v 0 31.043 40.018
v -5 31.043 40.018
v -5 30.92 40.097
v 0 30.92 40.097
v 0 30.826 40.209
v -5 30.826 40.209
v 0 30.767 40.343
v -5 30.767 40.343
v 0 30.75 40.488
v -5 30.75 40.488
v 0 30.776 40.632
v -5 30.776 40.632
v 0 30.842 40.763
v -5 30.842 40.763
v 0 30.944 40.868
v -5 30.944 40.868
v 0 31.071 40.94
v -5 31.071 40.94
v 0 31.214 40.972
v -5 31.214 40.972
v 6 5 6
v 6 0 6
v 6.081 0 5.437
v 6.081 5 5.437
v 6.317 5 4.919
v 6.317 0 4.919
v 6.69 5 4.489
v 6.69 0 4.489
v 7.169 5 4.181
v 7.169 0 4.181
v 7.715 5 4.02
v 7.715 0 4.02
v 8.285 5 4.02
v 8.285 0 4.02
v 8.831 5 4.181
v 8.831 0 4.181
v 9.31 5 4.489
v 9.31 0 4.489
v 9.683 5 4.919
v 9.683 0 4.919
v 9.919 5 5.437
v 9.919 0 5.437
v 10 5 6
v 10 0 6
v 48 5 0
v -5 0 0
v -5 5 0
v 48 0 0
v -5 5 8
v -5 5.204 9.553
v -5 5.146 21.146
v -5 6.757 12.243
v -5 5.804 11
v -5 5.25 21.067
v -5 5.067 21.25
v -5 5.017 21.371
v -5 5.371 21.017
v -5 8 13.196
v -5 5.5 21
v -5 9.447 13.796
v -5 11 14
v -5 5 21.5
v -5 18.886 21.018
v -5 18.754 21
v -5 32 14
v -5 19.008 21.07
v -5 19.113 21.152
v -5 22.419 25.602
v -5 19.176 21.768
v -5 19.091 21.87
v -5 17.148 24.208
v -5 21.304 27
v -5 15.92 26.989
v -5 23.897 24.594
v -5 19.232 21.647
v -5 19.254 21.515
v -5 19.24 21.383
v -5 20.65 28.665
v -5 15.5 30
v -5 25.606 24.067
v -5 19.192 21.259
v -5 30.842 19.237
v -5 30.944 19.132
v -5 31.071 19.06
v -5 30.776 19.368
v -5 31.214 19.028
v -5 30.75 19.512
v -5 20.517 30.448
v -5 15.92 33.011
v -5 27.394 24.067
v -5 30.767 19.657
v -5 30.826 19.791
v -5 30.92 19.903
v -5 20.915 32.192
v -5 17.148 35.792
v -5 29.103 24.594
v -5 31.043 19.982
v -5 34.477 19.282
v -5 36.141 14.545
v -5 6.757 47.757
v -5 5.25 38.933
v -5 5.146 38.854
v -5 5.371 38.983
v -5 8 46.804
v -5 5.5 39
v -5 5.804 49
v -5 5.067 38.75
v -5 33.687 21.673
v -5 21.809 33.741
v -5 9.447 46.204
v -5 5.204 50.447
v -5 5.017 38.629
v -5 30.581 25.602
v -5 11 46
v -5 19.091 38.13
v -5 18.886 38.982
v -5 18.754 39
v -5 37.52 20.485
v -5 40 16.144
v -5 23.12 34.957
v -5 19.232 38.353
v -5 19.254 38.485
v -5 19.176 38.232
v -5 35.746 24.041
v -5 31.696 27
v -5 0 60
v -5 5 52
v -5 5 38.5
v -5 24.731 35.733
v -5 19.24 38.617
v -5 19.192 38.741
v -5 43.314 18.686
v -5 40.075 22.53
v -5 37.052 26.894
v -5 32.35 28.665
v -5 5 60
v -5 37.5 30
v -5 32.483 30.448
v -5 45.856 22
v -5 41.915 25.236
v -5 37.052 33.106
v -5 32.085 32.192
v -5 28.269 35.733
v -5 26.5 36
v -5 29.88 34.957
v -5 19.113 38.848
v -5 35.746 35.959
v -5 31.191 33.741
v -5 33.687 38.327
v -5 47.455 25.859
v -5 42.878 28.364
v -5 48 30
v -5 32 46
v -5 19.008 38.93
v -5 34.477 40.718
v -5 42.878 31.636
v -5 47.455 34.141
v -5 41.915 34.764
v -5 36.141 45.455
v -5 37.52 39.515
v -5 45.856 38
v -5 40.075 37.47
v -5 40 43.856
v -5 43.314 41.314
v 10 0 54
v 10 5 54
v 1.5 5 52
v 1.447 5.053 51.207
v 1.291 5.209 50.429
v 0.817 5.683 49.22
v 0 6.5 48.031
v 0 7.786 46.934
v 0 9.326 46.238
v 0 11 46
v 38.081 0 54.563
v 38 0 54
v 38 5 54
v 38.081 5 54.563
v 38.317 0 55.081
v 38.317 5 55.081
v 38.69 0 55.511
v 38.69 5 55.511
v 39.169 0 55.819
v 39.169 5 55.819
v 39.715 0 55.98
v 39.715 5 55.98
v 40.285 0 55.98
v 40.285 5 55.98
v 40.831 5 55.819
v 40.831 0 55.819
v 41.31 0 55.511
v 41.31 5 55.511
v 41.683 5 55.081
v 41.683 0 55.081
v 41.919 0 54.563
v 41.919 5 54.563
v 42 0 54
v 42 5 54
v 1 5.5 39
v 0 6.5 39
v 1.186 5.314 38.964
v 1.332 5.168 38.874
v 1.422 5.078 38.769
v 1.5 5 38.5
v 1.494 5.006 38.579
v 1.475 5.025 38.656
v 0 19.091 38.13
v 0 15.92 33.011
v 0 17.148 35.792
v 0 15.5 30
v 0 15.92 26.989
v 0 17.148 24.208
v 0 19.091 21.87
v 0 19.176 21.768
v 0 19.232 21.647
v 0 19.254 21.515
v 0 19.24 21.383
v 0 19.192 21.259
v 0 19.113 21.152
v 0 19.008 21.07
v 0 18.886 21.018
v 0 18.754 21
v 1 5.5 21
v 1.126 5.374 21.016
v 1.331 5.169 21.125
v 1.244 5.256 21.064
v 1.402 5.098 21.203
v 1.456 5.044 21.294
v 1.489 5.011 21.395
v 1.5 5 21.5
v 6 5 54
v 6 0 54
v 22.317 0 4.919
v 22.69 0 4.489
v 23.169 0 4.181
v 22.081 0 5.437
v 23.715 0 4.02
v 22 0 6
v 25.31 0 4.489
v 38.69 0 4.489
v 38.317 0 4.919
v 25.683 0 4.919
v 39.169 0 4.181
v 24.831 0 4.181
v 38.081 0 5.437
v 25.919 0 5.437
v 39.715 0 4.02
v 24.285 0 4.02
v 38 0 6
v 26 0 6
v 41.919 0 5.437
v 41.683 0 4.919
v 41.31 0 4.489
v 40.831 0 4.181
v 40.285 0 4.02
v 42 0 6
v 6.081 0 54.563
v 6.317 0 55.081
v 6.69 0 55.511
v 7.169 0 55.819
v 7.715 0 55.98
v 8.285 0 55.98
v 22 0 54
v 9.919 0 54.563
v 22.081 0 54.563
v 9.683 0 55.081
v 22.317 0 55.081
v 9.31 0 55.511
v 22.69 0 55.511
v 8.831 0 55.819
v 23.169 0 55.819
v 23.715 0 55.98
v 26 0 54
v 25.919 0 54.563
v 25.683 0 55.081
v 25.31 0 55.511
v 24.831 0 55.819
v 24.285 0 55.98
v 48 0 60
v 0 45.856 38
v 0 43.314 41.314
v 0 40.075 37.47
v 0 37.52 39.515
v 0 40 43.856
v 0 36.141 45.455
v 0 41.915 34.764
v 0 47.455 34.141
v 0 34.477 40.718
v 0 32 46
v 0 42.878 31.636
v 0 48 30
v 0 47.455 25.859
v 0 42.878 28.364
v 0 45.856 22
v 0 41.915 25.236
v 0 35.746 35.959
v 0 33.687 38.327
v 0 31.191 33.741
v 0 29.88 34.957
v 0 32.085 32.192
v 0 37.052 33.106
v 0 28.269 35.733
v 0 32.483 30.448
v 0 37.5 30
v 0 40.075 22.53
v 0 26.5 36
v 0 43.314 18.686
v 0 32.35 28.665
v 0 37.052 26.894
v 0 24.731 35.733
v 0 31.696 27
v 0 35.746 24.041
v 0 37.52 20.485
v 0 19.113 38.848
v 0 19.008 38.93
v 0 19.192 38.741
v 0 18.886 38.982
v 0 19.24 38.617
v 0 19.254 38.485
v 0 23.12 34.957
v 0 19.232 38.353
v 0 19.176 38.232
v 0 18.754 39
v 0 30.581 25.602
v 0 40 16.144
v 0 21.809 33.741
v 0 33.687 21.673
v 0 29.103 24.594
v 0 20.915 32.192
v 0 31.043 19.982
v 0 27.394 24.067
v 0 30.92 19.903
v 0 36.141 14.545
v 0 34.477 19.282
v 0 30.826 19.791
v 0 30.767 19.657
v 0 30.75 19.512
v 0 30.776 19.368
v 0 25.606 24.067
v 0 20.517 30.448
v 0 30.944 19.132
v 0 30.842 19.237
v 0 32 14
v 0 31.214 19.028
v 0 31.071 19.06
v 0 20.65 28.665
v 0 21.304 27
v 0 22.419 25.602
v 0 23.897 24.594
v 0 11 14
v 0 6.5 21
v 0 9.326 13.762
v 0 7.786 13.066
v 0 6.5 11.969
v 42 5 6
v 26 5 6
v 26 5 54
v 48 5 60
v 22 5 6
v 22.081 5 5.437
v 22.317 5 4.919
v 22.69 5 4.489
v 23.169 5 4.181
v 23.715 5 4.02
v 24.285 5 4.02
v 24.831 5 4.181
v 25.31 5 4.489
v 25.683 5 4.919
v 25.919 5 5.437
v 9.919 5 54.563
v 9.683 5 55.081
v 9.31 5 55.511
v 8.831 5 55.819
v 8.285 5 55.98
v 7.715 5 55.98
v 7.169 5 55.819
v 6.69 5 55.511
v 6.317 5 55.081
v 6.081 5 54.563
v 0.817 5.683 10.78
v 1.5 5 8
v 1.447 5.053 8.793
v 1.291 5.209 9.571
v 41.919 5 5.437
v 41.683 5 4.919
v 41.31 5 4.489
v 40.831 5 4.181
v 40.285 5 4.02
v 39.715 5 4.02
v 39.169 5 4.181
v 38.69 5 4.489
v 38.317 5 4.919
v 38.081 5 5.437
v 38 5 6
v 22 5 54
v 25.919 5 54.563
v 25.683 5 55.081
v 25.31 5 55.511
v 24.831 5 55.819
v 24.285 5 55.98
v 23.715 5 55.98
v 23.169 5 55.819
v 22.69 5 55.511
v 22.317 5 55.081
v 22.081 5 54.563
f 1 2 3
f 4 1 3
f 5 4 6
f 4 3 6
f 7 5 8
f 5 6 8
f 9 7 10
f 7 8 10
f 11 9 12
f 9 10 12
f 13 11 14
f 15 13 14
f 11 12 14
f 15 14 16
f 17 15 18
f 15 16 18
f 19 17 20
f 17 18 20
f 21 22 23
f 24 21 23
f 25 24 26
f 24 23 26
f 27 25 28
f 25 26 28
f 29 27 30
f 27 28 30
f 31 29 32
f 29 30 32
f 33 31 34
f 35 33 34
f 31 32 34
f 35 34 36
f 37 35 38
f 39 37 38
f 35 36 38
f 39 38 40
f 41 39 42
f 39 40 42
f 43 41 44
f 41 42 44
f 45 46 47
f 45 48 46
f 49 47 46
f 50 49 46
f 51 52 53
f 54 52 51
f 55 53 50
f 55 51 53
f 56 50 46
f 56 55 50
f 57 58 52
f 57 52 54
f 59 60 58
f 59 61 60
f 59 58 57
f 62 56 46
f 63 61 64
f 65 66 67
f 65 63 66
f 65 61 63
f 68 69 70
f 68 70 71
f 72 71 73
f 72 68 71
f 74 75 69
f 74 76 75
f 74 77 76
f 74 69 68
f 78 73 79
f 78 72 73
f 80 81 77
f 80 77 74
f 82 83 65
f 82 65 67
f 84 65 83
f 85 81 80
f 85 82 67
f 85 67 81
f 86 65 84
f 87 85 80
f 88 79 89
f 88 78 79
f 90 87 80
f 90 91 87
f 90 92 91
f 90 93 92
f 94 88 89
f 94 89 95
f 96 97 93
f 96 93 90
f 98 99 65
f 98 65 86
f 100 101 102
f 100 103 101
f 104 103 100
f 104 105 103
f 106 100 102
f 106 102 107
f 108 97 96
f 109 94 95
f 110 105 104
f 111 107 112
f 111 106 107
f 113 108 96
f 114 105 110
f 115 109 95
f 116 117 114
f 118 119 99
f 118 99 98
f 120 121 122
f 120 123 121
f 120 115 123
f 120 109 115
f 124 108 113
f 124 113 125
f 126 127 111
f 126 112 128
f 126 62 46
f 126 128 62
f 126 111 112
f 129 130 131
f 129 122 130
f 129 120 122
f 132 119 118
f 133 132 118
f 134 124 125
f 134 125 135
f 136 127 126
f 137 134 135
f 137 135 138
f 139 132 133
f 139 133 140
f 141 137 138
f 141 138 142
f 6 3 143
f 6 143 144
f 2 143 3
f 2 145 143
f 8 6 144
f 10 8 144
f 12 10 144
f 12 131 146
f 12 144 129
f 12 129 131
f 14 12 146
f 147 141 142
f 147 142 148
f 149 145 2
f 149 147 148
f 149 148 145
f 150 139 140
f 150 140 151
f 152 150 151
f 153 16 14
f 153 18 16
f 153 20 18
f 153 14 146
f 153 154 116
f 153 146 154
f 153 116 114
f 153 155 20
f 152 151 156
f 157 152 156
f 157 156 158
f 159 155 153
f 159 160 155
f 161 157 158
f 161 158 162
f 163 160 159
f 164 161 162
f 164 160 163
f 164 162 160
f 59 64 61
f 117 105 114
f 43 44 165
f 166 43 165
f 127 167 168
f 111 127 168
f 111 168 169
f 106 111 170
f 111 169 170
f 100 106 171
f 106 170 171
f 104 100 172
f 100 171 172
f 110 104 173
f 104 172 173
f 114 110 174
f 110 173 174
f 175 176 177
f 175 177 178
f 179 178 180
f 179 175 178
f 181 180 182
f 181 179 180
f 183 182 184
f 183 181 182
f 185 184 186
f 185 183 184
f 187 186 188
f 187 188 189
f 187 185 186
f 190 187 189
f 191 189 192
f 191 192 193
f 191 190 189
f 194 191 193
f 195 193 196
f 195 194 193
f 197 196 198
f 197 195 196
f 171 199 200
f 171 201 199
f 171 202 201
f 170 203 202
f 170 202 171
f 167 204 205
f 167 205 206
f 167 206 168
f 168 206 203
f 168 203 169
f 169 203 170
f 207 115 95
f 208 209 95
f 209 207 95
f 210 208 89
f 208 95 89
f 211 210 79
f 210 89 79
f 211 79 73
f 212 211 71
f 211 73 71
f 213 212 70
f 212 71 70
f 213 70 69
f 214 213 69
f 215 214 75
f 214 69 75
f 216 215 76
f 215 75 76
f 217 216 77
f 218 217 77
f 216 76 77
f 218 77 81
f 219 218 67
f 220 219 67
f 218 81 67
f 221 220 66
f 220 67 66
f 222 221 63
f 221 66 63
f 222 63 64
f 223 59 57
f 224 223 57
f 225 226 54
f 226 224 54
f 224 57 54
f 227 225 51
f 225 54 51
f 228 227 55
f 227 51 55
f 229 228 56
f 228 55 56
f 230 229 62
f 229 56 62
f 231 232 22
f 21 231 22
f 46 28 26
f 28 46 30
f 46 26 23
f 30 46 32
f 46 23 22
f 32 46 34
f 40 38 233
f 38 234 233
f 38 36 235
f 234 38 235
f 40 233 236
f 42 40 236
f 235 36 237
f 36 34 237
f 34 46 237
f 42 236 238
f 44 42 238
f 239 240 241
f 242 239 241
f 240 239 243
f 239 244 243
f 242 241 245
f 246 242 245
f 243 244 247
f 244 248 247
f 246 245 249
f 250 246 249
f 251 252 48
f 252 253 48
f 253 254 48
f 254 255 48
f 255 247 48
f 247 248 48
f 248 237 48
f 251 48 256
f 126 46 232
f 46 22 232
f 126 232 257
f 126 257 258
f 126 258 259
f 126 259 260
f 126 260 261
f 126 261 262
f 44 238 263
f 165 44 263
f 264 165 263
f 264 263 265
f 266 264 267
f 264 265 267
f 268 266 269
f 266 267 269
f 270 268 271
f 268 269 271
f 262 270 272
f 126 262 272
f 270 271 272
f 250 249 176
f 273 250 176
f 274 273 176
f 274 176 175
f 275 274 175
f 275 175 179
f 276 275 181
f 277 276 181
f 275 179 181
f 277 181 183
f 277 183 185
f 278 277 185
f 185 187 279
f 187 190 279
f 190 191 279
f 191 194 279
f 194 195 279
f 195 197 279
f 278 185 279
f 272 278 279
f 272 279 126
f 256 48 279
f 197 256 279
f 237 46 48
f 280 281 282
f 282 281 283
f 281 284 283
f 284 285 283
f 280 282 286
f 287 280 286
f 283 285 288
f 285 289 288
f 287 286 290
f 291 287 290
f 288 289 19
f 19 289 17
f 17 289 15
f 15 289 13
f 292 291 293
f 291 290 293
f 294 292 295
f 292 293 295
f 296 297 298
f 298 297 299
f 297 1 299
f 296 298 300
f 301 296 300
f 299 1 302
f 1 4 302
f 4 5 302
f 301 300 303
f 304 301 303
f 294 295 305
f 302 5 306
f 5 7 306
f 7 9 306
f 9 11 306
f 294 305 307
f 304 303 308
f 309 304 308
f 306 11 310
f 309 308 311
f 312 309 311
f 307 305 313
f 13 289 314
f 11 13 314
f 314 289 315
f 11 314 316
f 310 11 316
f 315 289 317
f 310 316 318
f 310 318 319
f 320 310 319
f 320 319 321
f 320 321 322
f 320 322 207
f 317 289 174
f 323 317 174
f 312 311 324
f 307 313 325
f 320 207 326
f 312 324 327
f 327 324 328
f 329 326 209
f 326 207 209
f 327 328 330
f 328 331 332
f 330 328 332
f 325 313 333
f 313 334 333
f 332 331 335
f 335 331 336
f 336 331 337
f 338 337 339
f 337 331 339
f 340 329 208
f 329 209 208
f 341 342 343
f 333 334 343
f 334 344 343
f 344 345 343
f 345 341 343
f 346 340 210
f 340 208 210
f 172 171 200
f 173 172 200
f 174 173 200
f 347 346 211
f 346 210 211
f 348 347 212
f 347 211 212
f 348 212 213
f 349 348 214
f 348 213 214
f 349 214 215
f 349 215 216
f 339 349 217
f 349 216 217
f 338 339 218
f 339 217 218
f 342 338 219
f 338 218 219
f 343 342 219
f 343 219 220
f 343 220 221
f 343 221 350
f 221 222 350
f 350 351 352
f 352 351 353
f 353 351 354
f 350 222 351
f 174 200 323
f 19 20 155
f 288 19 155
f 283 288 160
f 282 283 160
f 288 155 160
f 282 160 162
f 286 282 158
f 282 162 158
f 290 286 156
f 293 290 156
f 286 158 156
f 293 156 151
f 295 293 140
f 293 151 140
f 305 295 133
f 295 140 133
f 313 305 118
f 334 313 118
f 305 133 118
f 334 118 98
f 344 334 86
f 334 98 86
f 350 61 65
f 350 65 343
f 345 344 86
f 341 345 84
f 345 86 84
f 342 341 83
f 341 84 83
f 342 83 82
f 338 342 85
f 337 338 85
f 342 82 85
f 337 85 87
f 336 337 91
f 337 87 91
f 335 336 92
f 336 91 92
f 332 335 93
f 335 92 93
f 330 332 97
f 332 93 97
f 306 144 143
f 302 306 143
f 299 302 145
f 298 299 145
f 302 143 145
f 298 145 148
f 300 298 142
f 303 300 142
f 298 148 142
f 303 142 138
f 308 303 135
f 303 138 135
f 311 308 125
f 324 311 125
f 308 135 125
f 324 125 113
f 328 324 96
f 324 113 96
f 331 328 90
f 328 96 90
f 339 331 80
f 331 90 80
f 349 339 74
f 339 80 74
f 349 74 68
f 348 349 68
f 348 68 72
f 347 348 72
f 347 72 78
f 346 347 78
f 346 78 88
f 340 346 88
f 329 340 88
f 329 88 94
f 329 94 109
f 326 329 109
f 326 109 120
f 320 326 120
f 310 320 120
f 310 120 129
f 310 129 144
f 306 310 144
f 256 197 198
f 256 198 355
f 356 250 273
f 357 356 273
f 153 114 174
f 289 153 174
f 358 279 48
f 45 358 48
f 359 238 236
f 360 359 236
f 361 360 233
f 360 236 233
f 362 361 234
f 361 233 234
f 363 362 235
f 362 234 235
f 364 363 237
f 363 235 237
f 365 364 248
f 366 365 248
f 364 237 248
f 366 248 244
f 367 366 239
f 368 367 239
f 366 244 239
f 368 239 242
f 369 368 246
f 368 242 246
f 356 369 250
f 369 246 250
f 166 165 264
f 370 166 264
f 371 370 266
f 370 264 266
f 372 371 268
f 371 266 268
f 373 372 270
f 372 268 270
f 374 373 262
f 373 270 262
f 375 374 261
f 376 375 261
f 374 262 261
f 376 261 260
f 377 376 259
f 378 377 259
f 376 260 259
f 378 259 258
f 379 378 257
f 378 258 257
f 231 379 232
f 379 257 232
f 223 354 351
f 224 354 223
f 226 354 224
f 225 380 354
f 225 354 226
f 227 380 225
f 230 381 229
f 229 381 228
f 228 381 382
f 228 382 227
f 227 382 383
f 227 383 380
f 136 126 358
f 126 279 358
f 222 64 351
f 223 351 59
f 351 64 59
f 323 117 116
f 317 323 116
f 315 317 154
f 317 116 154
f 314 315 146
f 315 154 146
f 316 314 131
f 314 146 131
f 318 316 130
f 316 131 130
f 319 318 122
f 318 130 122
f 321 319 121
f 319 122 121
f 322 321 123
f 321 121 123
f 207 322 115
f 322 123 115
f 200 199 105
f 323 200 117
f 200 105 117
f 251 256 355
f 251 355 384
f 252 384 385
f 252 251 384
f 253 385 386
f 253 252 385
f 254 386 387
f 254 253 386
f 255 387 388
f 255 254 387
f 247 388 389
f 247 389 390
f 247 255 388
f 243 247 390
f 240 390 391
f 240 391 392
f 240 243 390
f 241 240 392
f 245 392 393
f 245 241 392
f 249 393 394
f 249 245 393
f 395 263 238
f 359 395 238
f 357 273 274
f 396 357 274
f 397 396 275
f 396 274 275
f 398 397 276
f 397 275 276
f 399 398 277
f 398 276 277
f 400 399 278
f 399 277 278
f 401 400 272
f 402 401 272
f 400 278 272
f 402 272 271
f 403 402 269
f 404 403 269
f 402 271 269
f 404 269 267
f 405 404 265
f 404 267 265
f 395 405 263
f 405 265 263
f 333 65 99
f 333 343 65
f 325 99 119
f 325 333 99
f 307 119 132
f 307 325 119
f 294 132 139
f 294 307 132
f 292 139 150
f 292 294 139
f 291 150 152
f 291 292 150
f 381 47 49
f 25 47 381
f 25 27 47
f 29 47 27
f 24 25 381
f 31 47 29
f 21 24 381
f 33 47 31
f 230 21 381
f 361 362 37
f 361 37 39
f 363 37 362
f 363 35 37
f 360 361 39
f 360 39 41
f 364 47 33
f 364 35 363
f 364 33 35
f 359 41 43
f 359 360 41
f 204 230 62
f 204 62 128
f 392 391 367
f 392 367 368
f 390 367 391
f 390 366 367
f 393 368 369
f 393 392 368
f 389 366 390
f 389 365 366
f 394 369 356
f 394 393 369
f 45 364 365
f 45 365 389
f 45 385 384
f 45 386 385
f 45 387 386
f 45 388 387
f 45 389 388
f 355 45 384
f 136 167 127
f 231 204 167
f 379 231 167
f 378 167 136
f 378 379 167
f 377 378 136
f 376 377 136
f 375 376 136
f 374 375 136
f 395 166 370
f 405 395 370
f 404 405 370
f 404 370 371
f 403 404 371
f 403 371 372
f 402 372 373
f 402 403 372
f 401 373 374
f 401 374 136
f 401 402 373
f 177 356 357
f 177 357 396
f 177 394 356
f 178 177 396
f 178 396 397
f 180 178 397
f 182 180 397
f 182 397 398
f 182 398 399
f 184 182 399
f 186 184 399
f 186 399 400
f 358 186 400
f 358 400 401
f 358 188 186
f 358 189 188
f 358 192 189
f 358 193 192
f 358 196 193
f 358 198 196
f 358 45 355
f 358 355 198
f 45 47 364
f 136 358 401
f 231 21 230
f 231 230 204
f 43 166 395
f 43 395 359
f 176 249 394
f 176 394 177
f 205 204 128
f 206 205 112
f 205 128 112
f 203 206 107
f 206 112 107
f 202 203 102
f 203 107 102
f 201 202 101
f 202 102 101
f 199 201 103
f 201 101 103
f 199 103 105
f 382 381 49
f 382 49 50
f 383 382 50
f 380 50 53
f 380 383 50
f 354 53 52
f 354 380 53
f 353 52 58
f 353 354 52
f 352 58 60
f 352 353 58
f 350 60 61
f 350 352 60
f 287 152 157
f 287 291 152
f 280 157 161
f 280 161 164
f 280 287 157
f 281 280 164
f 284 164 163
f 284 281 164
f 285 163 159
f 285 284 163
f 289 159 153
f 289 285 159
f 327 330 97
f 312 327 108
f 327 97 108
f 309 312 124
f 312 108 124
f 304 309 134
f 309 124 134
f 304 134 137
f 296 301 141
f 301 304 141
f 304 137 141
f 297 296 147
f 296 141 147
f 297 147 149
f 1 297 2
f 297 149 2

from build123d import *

# Parameters (mm, degrees)
SKETCH1_W           = 48
SKETCH1_H           = 60
BOSS_EXTRUDE1_DEPTH = 5
SKETCH2_W           = 60
SKETCH2_H           = 5
BOSS_EXTRUDE2_DEPTH = 5
SKETCH4_W           = 5
SKETCH4_H           = 32
BOSS_EXTRUDE3_DEPTH = 43
FILLET2_R           = 6
CHAMFER1_SIZE       = 1.5
SKETCH6_R           = 6
CUT_EXTRUDE1_DEPTH  = 94.343451832
FILLET3_R           = 16
CUT_EXTRUDE2_DEPTH  = 94.343451832


with BuildPart() as part:
    # Sketch1 → Boss-Extrude1 (new body)
    with BuildSketch(Plane(origin=(0, 0, 0), x_dir=(1, 0, 0), z_dir=(0, 1, 0))):
        with Locations((24, -30)):
            Rectangle(SKETCH1_W, SKETCH1_H)
        with BuildLine():
            Line((10, -6), (10, -54))
            ThreePointArc((10, -54), (8, -56), (6, -54))
            Line((6, -54), (6, -6))
            ThreePointArc((6, -6), (8, -4), (10, -6))
        make_face(mode=Mode.SUBTRACT)
        with BuildLine():
            Line((38, -6), (38, -54))
            ThreePointArc((38, -54), (40, -56), (42, -54))
            Line((42, -54), (42, -6))
            ThreePointArc((42, -6), (40, -4), (38, -6))
        make_face(mode=Mode.SUBTRACT)
        with BuildLine():
            Line((26, -6), (26, -54))
            ThreePointArc((26, -54), (24, -56), (22, -54))
            Line((22, -54), (22, -6))
            ThreePointArc((22, -6), (24, -4), (26, -6))
        make_face(mode=Mode.SUBTRACT)
    extrude(amount=BOSS_EXTRUDE1_DEPTH)

    # Sketch2 → Boss-Extrude2 (add)
    with BuildSketch(Plane.ZY):
        with Locations((30, 2.5)):
            Rectangle(SKETCH2_W, SKETCH2_H)
    extrude(amount=BOSS_EXTRUDE2_DEPTH)

    # Sketch4 → Boss-Extrude3 (add)
    with BuildSketch(Plane(origin=(0, 5, 0), x_dir=(1, 0, 0), z_dir=(0, 1, 0))):
        with Locations((-2.5, -30)):
            Rectangle(SKETCH4_W, SKETCH4_H)
    extrude(amount=BOSS_EXTRUDE3_DEPTH)

    # Fillet2
    fillet2_edges = [part.edges().sort_by_distance(p)[0] for p in [
        (-2.5, 5, 46),
        (-2.5, 5, 14),
    ]]
    fillet(fillet2_edges, radius=FILLET2_R)

    # Chamfer1
    chamfer1_edges = [part.edges().sort_by_distance(p)[0] for p in [
        (0, 5, 30),
    ]]
    chamfer(chamfer1_edges, length=CHAMFER1_SIZE)

    # Sketch6 → Cut-Extrude1 (cut, through all)
    with BuildSketch(Plane.ZY.offset(5)):
        with Locations((30, 26.5)):
            Circle(SKETCH6_R)
    extrude(amount=-CUT_EXTRUDE1_DEPTH, mode=Mode.SUBTRACT)

    # Fillet3
    fillet3_edges = [part.edges().sort_by_distance(p)[0] for p in [
        (-2.5, 48, 46),
        (-2.5, 48, 14),
    ]]
    fillet(fillet3_edges, radius=FILLET3_R - 0.0001)  # a hair under: the kernel refuses the full size

    # Sketch7 → Cut-Extrude2 (cut, through all)
    with BuildSketch(Plane.ZY.offset(5)):
        with BuildLine():
            Line((21, 18.754033308), (21, 5.5))
            ThreePointArc((21, 5.5), (21.146446609, 5.146446609), (21.5, 5))
            Line((21.5, 5), (38.5, 5))
            ThreePointArc((38.5, 5), (38.853553391, 5.146446609), (39, 5.5))
            Line((39, 5.5), (39, 18.754033308))
            ThreePointArc((39, 18.754033308), (38.68057878, 19.220285712), (38.130434783, 19.090814468))
            ThreePointArc((38.130434783, 19.090814468), (30, 15.5), (21.869565217, 19.090814468))
            ThreePointArc((21.869565217, 19.090814468), (21.31942122, 19.220285712), (21, 18.754033308))
        make_face()
        with BuildLine():
            ThreePointArc((40.971902892, 31.214285714), (30, 43), (19.028097108, 31.214285714))
            ThreePointArc((19.028097108, 31.214285714), (19.438706545, 30.757825209), (19.982175621, 31.043478261))
            ThreePointArc((19.982175621, 31.043478261), (30, 37.5), (40.017824379, 31.043478261))
            ThreePointArc((40.017824379, 31.043478261), (40.561293455, 30.757825209), (40.971902892, 31.214285714))
        make_face()
    extrude(amount=-CUT_EXTRUDE2_DEPTH, mode=Mode.SUBTRACT)


solid = part.part
